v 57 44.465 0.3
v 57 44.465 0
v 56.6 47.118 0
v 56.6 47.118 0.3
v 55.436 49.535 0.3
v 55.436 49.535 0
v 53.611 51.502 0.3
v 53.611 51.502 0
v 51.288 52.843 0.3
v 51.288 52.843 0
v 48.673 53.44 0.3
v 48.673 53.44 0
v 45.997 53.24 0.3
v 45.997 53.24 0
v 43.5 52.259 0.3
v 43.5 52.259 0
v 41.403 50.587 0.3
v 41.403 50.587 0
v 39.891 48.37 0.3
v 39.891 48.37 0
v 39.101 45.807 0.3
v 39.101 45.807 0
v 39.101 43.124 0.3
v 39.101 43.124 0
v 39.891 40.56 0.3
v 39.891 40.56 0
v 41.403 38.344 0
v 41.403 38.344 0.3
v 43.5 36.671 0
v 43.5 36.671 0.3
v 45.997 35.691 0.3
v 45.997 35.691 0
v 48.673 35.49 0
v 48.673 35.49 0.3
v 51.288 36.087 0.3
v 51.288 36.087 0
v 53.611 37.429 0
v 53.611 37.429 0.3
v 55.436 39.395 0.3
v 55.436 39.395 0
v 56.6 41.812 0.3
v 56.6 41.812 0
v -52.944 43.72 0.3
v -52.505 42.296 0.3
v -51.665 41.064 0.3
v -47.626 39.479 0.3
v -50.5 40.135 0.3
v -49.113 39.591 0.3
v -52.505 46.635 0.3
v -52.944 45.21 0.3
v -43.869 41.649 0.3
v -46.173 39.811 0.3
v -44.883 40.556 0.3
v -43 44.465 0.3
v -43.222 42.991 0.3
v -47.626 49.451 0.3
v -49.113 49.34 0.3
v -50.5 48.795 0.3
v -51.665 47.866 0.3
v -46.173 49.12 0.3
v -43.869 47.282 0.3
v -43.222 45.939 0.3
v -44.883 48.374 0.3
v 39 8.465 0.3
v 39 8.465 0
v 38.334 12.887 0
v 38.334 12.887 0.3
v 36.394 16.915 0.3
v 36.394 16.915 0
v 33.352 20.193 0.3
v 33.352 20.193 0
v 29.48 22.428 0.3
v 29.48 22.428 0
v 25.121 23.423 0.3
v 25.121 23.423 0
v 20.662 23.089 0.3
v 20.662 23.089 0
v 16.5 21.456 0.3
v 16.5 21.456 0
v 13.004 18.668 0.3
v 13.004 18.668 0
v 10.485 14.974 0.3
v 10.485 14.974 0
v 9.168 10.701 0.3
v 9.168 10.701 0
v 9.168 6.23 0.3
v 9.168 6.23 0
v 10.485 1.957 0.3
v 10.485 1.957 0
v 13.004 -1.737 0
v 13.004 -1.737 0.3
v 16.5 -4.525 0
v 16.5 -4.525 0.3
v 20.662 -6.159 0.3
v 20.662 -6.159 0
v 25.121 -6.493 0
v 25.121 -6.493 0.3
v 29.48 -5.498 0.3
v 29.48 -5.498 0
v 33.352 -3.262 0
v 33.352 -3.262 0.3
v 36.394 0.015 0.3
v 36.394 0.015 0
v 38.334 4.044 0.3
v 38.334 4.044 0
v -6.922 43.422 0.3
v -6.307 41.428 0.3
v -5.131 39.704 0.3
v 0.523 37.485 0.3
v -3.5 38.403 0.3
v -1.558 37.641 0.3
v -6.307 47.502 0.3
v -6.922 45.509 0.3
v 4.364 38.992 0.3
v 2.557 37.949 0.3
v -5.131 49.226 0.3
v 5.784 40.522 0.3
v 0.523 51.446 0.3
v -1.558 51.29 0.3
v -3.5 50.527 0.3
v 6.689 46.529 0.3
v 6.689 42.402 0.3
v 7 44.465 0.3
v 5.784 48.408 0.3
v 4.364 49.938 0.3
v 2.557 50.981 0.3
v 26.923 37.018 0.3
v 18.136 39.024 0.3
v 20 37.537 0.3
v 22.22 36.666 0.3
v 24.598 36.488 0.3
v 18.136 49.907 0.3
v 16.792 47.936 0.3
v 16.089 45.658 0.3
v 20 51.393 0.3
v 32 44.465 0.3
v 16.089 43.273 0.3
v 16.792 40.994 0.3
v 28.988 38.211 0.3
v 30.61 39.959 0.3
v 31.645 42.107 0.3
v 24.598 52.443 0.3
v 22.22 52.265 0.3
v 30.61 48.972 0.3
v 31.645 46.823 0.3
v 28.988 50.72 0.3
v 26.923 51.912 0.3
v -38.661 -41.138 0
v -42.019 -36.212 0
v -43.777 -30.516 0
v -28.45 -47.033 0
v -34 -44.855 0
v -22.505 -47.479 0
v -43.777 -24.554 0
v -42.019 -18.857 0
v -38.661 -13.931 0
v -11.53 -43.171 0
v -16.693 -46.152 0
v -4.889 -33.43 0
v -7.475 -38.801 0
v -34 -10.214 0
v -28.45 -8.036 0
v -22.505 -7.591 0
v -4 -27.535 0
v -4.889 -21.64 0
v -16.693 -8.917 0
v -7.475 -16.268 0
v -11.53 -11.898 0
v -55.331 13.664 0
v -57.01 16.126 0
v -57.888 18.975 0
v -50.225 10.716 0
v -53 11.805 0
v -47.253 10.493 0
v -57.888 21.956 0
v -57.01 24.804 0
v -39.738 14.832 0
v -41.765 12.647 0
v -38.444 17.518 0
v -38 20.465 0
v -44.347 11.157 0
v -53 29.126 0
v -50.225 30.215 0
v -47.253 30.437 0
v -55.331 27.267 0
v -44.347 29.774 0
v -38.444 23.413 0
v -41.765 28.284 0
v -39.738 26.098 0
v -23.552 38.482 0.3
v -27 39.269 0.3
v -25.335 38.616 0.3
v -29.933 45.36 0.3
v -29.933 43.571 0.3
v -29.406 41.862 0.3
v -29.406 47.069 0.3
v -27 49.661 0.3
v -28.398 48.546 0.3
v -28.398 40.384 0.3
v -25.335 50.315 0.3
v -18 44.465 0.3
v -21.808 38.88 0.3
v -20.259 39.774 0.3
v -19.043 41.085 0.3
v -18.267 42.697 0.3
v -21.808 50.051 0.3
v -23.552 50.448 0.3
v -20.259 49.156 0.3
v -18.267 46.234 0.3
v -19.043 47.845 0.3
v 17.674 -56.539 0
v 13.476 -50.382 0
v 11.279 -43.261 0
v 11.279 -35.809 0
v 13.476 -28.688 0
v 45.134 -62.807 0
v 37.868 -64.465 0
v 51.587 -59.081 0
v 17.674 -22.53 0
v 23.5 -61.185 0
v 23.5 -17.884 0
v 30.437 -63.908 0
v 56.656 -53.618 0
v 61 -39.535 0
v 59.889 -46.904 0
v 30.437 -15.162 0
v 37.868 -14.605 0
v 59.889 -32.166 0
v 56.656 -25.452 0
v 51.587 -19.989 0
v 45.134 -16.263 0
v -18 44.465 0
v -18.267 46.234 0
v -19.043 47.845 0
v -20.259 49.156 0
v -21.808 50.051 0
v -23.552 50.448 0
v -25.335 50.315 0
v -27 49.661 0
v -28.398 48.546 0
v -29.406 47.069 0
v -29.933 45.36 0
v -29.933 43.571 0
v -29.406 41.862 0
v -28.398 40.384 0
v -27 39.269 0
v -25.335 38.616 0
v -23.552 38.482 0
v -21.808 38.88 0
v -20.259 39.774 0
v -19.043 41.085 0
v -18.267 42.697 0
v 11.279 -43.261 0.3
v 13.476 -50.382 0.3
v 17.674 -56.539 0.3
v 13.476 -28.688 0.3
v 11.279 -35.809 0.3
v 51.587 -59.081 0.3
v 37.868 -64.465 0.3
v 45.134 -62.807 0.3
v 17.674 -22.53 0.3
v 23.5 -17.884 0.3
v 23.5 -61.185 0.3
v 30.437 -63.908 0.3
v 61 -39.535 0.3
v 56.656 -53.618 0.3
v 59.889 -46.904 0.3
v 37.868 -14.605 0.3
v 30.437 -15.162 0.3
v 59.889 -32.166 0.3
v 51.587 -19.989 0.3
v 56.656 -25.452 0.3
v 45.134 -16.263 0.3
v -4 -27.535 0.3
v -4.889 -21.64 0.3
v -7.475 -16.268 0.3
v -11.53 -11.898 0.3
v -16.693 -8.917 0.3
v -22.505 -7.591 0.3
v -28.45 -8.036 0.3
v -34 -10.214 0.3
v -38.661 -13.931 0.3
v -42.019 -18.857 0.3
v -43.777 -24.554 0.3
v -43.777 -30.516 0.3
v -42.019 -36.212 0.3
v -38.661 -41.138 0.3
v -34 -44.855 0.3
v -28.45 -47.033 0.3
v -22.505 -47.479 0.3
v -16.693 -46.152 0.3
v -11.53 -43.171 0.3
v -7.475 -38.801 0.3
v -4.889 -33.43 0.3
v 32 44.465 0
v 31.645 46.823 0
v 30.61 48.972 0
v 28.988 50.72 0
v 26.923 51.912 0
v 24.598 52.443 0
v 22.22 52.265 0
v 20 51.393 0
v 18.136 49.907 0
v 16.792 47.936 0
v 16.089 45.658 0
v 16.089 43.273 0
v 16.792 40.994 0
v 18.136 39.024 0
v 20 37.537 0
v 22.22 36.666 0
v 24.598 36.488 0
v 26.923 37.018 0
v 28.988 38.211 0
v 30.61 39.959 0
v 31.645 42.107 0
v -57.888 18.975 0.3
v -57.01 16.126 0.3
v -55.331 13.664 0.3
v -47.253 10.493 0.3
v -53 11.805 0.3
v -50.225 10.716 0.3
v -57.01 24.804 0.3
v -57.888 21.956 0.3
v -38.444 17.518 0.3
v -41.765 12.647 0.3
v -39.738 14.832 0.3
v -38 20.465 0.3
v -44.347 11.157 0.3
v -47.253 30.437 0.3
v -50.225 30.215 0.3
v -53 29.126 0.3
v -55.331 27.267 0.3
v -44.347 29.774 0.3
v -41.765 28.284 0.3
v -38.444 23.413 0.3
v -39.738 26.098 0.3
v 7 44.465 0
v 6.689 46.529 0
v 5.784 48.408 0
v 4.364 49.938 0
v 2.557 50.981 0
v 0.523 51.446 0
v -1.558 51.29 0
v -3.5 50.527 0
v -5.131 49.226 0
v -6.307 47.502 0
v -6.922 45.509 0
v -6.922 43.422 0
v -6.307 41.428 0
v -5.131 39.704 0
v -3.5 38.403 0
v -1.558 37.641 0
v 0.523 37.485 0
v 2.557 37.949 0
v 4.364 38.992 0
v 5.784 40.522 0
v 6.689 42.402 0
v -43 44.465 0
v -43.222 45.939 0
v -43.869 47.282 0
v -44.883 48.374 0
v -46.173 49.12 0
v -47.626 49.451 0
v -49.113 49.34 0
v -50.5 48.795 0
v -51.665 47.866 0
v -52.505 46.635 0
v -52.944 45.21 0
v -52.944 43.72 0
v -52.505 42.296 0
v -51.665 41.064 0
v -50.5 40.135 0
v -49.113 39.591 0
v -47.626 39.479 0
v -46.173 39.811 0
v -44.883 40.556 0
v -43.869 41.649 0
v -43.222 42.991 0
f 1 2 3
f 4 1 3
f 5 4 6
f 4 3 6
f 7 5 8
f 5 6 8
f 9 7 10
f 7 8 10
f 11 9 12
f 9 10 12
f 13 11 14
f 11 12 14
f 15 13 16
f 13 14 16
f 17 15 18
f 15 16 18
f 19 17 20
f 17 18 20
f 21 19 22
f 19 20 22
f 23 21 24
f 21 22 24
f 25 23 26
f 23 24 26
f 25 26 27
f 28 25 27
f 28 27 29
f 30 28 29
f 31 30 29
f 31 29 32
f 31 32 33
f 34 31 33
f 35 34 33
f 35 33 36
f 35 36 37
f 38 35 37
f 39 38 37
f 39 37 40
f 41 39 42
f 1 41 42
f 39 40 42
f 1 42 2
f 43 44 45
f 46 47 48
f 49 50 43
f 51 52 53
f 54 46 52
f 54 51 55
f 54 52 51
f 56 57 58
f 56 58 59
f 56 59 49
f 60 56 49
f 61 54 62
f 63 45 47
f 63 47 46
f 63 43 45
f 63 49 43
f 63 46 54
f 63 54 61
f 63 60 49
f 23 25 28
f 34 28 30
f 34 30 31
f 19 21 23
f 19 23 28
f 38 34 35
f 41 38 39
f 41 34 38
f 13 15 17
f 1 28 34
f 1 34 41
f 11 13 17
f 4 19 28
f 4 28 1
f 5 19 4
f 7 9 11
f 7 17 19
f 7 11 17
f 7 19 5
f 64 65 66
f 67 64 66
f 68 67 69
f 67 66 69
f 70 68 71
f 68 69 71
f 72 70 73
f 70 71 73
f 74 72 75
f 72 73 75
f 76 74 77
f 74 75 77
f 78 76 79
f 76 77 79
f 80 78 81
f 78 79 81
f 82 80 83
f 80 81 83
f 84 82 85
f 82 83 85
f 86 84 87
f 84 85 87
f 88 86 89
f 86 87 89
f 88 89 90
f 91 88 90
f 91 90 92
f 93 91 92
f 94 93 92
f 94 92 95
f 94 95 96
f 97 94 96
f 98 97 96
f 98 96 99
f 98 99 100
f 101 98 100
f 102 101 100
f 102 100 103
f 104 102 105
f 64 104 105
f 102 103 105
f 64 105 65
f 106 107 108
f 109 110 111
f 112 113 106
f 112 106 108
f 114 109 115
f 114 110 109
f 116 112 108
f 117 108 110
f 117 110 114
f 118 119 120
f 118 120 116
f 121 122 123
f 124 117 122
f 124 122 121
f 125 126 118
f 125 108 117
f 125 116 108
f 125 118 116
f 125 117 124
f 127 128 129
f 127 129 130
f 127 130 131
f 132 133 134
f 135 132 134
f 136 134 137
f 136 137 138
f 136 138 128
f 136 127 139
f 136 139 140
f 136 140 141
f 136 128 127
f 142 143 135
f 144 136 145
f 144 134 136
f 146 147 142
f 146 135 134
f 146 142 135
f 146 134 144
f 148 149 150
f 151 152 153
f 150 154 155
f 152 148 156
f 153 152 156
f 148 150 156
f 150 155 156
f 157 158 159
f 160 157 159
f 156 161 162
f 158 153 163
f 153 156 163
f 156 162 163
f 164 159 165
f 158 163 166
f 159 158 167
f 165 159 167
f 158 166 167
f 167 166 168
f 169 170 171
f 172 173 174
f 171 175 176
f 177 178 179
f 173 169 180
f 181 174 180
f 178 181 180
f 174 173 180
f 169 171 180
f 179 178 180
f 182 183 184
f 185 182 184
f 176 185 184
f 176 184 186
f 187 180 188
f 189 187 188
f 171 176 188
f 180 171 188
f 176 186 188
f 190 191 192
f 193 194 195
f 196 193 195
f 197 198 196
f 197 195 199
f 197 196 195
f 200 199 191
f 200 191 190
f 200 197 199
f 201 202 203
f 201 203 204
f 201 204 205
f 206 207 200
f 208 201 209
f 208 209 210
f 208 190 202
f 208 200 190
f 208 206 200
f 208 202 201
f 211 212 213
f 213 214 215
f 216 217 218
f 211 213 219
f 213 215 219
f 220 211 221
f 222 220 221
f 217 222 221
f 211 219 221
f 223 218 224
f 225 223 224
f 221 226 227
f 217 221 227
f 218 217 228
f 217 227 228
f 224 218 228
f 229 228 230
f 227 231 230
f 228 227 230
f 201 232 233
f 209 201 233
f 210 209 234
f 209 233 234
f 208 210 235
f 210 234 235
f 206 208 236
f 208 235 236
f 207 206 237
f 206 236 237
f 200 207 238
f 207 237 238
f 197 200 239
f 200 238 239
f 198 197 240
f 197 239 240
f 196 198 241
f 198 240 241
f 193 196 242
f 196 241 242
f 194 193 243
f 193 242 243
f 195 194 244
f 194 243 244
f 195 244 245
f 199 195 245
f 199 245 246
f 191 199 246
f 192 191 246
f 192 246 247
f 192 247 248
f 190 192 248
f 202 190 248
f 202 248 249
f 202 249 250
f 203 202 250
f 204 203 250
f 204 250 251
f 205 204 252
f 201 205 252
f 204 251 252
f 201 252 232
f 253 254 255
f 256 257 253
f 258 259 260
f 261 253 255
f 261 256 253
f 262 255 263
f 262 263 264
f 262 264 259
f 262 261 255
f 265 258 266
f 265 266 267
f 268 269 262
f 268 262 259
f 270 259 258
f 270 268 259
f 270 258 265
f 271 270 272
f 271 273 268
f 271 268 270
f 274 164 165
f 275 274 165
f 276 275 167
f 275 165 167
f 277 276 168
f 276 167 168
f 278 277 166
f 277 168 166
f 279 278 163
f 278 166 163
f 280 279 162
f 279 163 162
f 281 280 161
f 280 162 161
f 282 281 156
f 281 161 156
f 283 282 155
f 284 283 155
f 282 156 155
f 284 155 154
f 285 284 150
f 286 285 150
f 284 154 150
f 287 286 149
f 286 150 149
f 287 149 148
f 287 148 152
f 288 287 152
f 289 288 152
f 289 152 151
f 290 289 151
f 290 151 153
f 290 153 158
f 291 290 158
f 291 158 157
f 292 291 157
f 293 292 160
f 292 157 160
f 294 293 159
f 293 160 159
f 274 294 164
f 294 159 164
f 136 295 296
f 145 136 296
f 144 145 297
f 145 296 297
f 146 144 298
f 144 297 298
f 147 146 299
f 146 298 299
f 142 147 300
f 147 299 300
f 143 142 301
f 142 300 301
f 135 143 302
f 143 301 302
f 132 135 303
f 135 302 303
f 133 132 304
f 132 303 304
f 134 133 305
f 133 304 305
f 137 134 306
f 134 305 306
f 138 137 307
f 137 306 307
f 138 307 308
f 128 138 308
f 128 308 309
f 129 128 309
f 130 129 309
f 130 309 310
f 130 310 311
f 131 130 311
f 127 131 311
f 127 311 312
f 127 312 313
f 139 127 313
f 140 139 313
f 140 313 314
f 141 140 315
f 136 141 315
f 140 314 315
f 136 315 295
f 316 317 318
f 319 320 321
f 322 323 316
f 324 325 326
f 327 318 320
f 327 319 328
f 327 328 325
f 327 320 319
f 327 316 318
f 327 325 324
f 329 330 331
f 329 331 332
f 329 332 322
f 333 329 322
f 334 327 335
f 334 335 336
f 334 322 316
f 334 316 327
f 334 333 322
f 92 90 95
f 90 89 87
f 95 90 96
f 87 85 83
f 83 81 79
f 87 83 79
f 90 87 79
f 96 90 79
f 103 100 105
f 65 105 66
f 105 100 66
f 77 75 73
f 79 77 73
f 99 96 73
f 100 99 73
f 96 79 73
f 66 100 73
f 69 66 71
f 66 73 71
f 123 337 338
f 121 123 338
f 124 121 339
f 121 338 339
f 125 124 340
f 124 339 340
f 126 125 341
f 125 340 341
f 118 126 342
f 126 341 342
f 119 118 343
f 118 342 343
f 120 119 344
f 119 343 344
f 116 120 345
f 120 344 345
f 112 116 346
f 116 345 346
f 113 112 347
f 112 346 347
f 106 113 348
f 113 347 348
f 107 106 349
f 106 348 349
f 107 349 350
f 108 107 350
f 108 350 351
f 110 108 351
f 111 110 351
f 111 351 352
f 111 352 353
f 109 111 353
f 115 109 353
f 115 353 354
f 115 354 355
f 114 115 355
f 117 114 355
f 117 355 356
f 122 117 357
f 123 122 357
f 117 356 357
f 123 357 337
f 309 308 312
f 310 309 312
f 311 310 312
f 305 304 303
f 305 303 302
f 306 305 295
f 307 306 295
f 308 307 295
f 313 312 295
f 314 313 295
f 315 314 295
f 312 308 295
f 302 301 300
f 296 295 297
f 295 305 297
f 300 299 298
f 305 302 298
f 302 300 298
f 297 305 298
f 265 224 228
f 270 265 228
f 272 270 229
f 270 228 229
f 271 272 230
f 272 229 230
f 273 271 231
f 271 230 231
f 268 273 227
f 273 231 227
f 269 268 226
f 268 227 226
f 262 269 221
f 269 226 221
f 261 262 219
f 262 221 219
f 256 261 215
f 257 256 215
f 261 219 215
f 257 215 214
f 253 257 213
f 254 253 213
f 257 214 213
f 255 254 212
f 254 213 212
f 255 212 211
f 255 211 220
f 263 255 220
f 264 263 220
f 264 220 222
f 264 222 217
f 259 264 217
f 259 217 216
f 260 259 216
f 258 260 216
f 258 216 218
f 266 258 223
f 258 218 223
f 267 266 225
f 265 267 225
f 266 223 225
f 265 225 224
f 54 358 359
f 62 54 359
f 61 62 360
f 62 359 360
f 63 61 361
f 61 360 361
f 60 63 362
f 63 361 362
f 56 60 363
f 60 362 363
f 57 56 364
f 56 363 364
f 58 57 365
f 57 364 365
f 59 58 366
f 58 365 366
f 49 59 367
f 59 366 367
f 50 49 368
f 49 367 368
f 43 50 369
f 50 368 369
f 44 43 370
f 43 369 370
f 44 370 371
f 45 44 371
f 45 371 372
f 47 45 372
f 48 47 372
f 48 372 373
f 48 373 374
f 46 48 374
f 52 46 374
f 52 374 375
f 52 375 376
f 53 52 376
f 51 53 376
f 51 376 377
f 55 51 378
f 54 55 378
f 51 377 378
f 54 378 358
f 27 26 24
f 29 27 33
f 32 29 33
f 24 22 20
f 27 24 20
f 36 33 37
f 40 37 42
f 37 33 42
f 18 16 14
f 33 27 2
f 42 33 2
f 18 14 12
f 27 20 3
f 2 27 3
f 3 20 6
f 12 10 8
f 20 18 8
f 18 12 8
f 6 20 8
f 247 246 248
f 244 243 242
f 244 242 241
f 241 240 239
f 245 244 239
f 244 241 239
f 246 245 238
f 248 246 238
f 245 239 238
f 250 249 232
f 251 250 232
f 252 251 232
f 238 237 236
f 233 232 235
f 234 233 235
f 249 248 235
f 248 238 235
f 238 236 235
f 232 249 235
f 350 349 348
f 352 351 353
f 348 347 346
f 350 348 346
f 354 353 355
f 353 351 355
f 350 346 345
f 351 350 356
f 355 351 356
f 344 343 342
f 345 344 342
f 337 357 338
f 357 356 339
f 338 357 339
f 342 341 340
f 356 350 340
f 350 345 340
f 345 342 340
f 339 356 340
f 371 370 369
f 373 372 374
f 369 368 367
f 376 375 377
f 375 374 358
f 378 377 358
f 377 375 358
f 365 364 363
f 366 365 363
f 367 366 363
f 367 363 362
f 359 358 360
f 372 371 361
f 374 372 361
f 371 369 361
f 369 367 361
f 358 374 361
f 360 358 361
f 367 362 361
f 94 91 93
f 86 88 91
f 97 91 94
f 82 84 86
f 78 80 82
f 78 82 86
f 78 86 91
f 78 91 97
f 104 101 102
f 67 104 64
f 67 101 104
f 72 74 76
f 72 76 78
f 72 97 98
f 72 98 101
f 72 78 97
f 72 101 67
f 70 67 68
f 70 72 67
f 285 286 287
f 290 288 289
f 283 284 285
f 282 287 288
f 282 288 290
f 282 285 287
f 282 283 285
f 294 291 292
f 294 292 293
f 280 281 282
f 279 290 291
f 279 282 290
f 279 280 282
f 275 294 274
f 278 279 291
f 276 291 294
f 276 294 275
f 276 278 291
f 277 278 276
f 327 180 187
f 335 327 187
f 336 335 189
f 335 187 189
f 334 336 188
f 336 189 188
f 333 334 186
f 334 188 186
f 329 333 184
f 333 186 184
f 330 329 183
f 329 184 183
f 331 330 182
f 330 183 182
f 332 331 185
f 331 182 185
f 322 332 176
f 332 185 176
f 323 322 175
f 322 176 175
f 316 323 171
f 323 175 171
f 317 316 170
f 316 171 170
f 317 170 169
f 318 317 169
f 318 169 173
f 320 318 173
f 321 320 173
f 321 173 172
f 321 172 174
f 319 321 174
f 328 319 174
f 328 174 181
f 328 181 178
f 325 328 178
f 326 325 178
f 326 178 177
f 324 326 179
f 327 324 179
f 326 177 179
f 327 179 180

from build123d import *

# Parameters (mm, degrees)
F0_R     = 5
F0_R_2   = 10
F0_R_3   = 6
F0_R_4   = 7
F0_R_5   = 8
F0_R_6   = 9
F0_R_7   = 15
F0_R_8   = 20
F0_R_9   = 25
F1_DEPTH = 0.3


with BuildPart() as f1:
    # F0 (on Top) → F1 (new body)
    with BuildSketch(Plane.XY):
        with Locations((-48, 44.465259)):
            Circle(F0_R)
        with Locations((-48, 20.465259)):
            Circle(F0_R_2)
        with Locations((-24, 44.465259)):
            Circle(F0_R_3)
        with Locations((0, 44.465259)):
            Circle(F0_R_4)
        with Locations((24, 44.465259)):
            Circle(F0_R_5)
        with Locations((48, 44.465259)):
            Circle(F0_R_6)
        with Locations((24, 8.465259)):
            Circle(F0_R_7)
        with Locations((-24, -27.534741)):
            Circle(F0_R_8)
        with Locations((36, -39.534741)):
            Circle(F0_R_9)
    extrude(amount=F1_DEPTH)


solid = f1.part
